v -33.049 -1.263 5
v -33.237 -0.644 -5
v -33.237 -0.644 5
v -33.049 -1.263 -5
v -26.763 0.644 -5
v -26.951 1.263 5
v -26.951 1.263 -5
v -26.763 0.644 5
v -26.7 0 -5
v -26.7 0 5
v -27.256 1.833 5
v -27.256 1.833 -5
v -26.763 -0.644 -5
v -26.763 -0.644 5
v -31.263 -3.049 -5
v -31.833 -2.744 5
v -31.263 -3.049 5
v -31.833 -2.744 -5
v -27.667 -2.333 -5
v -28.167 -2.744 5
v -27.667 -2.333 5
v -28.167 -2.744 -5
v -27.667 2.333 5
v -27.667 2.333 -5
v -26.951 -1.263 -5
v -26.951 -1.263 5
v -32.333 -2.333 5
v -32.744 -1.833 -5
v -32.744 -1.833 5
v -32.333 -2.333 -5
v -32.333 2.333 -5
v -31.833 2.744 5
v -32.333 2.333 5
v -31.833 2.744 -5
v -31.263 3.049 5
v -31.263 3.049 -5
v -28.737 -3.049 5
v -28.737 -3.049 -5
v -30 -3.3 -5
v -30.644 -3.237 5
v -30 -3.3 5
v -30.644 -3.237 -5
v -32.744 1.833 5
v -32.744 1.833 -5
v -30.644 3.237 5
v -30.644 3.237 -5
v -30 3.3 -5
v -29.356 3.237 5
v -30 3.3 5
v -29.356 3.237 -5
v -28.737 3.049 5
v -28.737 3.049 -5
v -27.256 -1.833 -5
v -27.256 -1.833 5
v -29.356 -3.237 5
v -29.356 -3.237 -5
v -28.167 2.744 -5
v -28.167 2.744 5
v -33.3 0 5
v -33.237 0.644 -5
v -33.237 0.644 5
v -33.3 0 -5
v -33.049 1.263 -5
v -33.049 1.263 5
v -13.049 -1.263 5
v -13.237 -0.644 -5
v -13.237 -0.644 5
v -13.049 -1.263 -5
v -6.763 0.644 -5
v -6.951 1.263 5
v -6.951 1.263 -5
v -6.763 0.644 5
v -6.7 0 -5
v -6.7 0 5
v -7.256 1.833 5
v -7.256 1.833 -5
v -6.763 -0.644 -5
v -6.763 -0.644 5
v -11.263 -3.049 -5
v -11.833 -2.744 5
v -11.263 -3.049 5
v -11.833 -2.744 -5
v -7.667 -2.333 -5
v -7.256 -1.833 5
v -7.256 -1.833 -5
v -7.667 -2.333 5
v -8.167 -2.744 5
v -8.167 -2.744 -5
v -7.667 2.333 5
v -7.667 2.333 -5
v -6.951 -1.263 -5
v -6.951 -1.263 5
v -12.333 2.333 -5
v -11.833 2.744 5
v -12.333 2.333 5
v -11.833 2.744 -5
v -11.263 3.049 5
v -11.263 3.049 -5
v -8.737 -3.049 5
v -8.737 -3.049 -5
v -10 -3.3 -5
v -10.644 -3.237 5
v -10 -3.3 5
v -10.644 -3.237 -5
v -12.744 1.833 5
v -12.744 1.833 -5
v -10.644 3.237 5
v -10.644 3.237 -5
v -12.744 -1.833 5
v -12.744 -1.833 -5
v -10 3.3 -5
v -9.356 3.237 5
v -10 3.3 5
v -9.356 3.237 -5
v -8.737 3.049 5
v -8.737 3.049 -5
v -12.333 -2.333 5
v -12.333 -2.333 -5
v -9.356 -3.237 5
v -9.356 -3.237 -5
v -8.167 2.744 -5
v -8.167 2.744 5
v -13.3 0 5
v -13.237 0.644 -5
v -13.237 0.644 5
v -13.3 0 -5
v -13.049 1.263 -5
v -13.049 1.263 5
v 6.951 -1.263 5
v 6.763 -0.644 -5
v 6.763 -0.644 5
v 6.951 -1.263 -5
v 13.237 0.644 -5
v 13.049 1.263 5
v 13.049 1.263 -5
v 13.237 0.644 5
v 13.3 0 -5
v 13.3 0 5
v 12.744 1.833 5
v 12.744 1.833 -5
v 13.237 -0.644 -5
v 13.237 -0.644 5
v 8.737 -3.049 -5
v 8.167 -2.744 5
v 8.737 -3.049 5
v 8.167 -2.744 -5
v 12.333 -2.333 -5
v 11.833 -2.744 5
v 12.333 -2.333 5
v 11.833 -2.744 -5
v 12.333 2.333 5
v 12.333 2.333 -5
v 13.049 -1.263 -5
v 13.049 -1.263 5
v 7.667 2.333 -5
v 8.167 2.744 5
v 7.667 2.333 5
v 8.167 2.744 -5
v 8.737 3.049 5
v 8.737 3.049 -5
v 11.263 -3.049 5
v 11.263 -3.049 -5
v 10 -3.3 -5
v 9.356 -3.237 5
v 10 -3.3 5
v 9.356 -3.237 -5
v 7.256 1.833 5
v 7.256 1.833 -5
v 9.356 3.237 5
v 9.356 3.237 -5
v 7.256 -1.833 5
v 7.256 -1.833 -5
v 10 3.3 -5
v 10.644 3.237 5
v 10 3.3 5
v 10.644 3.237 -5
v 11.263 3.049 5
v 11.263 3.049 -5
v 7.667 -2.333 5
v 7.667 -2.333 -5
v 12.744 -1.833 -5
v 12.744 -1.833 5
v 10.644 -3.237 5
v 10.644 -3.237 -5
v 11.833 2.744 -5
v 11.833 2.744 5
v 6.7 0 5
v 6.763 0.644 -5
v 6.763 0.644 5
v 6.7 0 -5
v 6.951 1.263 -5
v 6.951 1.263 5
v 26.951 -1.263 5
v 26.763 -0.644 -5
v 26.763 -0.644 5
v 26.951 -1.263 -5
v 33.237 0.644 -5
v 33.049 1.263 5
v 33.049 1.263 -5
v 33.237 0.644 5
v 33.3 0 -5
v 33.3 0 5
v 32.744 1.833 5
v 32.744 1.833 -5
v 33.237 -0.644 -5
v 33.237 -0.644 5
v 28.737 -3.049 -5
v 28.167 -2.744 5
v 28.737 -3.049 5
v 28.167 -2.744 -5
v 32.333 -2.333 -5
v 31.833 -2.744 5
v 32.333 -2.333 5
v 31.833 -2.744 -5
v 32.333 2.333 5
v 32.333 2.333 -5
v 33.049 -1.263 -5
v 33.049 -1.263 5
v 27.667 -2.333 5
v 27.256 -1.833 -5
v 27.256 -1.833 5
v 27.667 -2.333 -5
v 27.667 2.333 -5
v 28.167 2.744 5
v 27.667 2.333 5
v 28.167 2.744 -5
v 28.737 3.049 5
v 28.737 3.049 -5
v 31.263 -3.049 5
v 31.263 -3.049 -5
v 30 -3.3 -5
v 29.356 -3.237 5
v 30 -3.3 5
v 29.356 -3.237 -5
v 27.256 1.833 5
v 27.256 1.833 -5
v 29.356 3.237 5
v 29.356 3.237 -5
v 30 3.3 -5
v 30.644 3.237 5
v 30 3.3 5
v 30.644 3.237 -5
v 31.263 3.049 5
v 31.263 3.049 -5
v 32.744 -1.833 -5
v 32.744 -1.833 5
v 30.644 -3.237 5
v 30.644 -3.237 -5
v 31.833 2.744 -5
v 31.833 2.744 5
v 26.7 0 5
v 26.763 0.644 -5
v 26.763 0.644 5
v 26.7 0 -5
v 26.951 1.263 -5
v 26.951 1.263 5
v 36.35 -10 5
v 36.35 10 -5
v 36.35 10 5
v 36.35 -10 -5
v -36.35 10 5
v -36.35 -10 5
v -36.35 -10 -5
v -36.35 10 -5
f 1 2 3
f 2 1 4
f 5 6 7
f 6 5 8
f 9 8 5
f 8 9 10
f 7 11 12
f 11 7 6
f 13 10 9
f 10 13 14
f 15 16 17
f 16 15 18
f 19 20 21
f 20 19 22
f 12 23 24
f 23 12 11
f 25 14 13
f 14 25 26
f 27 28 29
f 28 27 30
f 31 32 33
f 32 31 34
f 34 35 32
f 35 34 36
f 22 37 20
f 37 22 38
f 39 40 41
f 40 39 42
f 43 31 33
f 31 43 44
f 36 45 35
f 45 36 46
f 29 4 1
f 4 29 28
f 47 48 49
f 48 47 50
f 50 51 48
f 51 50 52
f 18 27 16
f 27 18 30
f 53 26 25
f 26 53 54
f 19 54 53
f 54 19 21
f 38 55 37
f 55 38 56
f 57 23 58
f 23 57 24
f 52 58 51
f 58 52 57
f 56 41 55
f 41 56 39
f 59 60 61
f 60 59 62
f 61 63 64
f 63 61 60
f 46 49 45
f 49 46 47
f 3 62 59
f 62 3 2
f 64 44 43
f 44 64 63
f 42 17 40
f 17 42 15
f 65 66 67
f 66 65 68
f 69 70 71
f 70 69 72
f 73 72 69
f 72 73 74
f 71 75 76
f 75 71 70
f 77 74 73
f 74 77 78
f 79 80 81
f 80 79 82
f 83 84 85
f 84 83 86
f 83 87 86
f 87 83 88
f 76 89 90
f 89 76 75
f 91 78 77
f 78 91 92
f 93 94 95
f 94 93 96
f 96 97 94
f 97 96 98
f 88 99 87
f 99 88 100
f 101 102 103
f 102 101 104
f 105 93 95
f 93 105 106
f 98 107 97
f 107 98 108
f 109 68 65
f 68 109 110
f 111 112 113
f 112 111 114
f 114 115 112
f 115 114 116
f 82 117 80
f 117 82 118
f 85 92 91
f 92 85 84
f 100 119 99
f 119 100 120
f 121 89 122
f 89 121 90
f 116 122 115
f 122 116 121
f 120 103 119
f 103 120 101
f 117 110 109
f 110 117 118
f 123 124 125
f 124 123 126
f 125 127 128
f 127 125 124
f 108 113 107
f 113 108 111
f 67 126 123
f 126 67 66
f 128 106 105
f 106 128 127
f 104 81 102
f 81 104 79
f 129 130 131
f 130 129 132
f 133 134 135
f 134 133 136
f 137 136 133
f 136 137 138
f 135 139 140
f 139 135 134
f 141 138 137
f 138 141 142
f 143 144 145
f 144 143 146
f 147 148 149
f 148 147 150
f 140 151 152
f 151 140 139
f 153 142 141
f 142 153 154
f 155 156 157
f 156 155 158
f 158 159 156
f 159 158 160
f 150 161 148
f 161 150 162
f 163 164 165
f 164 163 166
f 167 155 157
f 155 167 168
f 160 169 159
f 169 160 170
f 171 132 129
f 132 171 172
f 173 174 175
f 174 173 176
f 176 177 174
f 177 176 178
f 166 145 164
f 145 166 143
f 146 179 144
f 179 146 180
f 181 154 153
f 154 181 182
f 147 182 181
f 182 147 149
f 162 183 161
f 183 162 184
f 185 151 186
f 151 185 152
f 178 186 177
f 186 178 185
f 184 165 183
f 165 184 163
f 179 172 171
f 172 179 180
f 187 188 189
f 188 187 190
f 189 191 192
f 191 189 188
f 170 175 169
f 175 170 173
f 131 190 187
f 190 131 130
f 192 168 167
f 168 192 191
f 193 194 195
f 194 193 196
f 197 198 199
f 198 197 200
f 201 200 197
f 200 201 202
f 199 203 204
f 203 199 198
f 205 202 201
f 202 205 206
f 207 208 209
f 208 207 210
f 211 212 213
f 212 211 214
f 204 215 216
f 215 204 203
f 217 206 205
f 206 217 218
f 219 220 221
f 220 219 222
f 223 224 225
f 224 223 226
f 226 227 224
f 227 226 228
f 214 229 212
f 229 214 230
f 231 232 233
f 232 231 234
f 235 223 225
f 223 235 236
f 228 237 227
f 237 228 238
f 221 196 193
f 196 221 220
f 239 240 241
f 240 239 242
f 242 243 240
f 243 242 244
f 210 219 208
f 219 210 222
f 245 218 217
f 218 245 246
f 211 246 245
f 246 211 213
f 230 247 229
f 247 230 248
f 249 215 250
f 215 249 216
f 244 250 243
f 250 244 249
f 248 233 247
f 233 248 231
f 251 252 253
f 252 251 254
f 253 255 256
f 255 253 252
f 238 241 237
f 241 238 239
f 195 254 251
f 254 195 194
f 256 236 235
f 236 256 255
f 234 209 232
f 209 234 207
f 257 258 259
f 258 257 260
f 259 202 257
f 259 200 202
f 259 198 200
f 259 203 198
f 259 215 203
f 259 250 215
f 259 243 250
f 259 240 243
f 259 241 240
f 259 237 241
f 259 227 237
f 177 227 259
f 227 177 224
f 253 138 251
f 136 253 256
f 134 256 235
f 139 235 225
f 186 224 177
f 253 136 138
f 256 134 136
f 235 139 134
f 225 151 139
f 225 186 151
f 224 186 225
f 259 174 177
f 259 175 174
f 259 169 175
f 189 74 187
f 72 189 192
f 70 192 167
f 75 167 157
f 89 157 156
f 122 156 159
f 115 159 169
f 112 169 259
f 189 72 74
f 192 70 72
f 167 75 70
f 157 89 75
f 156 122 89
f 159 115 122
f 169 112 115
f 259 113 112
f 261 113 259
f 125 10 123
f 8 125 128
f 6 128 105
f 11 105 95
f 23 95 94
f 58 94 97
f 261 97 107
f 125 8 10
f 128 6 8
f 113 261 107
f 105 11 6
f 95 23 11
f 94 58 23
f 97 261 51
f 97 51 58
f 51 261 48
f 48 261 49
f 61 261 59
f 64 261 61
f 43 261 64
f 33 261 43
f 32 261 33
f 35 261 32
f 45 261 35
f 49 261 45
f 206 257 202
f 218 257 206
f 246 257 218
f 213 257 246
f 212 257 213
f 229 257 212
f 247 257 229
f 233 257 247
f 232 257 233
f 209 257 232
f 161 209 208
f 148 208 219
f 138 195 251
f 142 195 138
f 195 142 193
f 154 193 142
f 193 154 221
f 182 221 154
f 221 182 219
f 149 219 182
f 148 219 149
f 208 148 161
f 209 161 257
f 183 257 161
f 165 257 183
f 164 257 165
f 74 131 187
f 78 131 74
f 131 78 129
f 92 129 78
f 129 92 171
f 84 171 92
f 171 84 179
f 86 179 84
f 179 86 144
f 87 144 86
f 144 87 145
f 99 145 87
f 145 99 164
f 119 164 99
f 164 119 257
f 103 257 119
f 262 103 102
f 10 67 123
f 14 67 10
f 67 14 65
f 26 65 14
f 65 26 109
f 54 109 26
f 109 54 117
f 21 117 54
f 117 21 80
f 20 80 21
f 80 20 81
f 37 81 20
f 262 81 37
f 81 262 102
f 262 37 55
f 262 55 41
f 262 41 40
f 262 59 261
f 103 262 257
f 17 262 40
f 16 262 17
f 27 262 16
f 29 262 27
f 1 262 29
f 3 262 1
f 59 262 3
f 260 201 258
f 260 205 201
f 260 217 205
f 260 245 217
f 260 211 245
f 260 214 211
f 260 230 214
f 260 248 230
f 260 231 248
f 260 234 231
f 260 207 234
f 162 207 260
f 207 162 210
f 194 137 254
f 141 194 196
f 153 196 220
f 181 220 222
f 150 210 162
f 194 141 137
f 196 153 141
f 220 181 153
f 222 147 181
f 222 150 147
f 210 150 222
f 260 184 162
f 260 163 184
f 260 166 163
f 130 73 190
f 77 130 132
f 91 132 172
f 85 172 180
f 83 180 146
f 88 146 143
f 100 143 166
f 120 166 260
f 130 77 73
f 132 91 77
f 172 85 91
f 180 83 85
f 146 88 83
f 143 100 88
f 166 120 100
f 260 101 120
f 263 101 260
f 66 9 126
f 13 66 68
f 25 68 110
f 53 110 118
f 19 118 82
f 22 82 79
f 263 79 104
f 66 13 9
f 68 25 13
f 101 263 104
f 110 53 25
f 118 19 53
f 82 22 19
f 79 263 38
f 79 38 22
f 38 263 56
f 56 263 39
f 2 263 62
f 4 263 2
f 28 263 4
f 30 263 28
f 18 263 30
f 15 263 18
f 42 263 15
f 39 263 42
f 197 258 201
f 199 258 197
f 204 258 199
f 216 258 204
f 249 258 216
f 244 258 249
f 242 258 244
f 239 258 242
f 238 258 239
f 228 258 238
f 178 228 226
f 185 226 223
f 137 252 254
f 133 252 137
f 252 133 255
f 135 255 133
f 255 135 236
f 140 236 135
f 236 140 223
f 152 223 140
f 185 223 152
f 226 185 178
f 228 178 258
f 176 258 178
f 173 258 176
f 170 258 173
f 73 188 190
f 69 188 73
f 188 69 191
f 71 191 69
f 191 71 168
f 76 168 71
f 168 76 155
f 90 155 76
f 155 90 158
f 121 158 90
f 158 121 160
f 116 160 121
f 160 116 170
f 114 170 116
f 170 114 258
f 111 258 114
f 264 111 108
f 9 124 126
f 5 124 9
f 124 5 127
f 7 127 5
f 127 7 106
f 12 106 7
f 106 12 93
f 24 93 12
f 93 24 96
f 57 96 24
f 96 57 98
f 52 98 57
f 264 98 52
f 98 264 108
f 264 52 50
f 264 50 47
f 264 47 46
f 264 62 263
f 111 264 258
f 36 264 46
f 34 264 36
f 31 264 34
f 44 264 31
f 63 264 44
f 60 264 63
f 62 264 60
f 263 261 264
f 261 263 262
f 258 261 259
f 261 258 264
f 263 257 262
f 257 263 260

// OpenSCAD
$fn = 32;

// ----------------------------------------------------------------------
// Hole bar, 4 x Ø6.6
// skip layout, 6.35 mm edge offset
// ----------------------------------------------------------------------

// --- parameters (mm) ---
bar_w = 20;       // bar width (Y)
bar_t = 10;       // bar thickness (Z)
holes = 4;        // holes per row
hole_d = 6.6;     // hole diameter
edge = 6.35;      // offset from the bar end to the first hole
grid_pitch = 10;  // grid the bar was laid out on

// --- derived feature positions (mm) ---
pitch = grid_pitch * 2;       // = 20   holes sit every other grid slot
span = (holes - 1) * pitch;   // = 60   distance between the end holes
bar_l = span + 2 * edge;      // = 72.7   overall bar length
start_x = -bar_l / 2 + edge;  // = -30   X of the first hole
feature_centers = [
  [start_x + 0 * pitch, 0],
  [start_x + 1 * pitch, 0],
  [start_x + 2 * pitch, 0],
  [start_x + 3 * pitch, 0]
];   // hole centres of the first row

// bar with one row of holes, drilled from feature_centers
difference() {
  translate([-bar_l / 2, -bar_w / 2, -bar_t / 2]) cube([bar_l, bar_w, bar_t]);
  for (centre = feature_centers)
    translate([centre[0], centre[1], 0])
      cylinder(d = hole_d, h = bar_t + 2, center = true);
}
